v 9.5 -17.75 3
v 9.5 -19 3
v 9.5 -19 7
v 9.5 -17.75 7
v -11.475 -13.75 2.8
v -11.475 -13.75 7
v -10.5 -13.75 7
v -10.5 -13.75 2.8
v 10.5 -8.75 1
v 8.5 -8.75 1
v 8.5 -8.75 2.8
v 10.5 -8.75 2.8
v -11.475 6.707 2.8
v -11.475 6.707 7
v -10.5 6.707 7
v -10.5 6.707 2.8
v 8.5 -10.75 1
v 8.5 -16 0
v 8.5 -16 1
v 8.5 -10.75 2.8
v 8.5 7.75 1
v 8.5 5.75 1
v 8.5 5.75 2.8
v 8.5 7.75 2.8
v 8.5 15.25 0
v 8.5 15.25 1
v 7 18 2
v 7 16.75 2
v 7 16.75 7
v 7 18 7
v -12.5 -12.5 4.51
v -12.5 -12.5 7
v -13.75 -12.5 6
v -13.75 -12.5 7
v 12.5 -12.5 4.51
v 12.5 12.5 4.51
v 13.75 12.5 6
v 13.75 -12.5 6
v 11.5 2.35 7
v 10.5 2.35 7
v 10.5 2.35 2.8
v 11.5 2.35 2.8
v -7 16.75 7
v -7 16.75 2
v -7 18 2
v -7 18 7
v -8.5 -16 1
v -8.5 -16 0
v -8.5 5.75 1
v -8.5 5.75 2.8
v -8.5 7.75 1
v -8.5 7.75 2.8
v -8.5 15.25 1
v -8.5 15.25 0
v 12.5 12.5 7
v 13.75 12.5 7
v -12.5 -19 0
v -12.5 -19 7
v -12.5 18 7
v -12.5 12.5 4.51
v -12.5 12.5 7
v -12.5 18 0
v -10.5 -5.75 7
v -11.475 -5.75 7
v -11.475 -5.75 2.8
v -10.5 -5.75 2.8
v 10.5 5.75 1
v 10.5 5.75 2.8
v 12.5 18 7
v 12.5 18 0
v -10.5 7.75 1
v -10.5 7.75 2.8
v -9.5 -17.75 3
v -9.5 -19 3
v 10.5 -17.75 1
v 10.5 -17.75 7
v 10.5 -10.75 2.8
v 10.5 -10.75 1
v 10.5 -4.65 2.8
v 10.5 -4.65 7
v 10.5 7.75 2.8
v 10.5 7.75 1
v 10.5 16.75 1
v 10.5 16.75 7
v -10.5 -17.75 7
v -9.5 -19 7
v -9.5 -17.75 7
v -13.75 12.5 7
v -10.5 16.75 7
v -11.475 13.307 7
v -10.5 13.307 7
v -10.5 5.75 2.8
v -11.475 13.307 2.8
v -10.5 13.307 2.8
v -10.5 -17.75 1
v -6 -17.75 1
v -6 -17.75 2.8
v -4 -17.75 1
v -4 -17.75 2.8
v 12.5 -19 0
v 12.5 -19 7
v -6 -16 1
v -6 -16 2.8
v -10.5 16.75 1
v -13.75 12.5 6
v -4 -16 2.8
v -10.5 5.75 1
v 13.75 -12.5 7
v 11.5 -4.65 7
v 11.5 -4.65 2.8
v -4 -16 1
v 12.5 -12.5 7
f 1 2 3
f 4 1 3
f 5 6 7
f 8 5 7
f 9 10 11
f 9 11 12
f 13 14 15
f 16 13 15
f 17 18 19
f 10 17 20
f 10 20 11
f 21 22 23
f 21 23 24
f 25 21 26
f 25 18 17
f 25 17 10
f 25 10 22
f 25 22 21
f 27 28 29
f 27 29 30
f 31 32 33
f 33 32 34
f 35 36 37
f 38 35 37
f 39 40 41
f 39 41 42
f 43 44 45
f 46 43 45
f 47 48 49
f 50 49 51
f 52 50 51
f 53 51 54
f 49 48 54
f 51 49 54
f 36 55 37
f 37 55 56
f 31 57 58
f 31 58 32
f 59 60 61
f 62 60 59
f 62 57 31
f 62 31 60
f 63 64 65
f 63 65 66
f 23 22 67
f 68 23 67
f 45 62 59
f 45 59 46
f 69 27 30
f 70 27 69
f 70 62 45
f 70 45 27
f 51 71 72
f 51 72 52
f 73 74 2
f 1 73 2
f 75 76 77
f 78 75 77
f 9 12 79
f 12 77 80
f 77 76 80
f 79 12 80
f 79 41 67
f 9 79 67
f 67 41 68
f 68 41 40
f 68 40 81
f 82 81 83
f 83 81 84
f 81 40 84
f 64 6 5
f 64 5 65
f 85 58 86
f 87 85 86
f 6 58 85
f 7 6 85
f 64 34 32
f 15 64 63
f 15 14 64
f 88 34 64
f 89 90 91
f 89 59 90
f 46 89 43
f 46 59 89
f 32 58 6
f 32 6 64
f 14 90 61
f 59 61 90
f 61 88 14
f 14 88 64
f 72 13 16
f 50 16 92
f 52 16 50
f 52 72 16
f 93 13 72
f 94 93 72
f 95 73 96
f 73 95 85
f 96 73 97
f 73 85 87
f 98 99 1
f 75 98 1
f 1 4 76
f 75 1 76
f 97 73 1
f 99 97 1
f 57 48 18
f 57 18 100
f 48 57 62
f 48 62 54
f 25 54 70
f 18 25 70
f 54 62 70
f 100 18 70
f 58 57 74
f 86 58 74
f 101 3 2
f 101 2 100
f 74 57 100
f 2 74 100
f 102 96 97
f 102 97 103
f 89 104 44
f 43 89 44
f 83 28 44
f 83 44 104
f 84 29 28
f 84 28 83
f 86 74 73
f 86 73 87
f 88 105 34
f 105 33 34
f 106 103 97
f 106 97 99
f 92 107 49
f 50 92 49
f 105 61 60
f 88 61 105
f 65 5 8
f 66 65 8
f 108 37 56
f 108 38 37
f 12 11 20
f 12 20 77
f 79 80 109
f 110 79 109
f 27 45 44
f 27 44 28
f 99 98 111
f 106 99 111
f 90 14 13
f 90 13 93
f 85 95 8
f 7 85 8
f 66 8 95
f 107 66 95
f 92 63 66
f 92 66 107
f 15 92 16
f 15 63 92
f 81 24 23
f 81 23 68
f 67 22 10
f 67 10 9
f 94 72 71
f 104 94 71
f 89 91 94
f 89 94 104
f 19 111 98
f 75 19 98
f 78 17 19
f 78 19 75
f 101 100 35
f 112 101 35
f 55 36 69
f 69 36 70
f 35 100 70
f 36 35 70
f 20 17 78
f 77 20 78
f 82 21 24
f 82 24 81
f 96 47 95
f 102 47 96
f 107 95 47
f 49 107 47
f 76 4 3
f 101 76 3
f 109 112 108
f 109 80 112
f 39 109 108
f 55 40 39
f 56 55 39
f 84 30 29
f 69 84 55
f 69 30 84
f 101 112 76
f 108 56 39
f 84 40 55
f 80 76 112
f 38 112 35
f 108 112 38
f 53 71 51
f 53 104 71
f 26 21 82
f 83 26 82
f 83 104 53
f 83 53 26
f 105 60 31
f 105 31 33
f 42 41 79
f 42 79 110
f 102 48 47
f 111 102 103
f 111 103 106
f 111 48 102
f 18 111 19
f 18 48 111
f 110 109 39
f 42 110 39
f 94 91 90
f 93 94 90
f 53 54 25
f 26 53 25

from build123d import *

# Parameters (mm, degrees)
F0_W      = 25
F0_H      = 38
F1_DEPTH  = 7
F2_W      = 21
F2_H      = 34.5
F3_DEPTH  = 6
F4_W      = 2
F4_H      = 2
F5_DEPTH  = 1.8
F6_W      = 17
F6_H      = 31.25
F7_DEPTH  = 7.001
F8_W      = 0.0254269466
F8_H      = 6.6
F8_W_2    = 0.9745730534
F8_W_3    = 1
F8_H_2    = 7
F8_H_3    = 8
F9_DEPTH  = 4.2
F11_W     = 14
F11_H     = 5
F12_DEPTH = 5
F13_DEPTH = 1
F15_DEPTH = 12.5
F16_W     = 19
F16_H     = 4
F17_DEPTH = 3


# Not quite as in the source:
# - a pattern or mirror of a feature is missing from the dataset's text; its kind, count and spacing are read off the source's solid
# - a feature names something its author has since deleted; it is built from what else it names


with BuildPart() as f1:
    # F0 (on Top) → F1 (new body)
    with BuildSketch(Plane.XY):
        Rectangle(F0_W, F0_H)
    extrude(amount=F1_DEPTH)

    # F2 (on face) → F3 (cut)
    with BuildSketch(Plane.XY.offset(7)):
        with Locations((0, -0.5)):
            Rectangle(F2_W, F2_H)
    extrude(amount=-F3_DEPTH, mode=Mode.SUBTRACT)

    # F4 (on face) → F5 (join)
    with BuildSketch(Plane.XY.offset(1)):
        with Locations((-9.5, 6.75)):
            Rectangle(F4_W, F4_H)
        with Locations((9.5, 6.75)):
            Rectangle(F4_W, F4_H)
        with Locations((9.5, -9.75)):
            Rectangle(F4_W, F4_H)
        with Locations((-5, -17)):
            Rectangle(F4_W, F4_H)
    extrude(amount=F5_DEPTH)

    # F6 (on Top) → F7 (cut, through all)
    with BuildSketch(Plane.XY):
        with Locations((0, -0.375)):
            Rectangle(F6_W, F6_H)
    extrude(amount=F7_DEPTH, mode=Mode.SUBTRACT)

    # F8 (on face) → F9 (cut, through all)
    with BuildSketch(Plane.XY.offset(7)):
        with Locations((-10.4872865267, 10.0065428064)):
            Rectangle(F8_W, F8_H)
        with Locations((-10.9872865267, 10.0065428064)):
            Rectangle(F8_W_2, F8_H)
        with Locations((11, -1.15)):
            Rectangle(F8_W_3, F8_H_2)
        with Locations((-10.9872865267, -9.75)):
            Rectangle(F8_W_2, F8_H_3)
    extrude(amount=-F9_DEPTH, mode=Mode.SUBTRACT)

    # F11 (on offset) → F12 (cut)
    with BuildSketch(Plane.XY.offset(2)):
        with Locations((0, 19.25)):
            Rectangle(F11_W, F11_H)
    extrude(amount=F12_DEPTH, mode=Mode.SUBTRACT)

    # F13 (cut): a face of the model
    f13_faces = [f1.faces().sort_by_distance(p)[0] for p in [
        (0, 19, 0.2596150997),
    ]]
    extrude(f13_faces, amount=-F13_DEPTH, mode=Mode.SUBTRACT)

    # F14 (on Front) → F15 (join, symmetric)
    with BuildSketch(Plane.XZ):
        Polygon((13.75, 7), (12.5, 7), (12.5, 4.5103080093), (13.75, 6), align=None)
    f15 = extrude(amount=F15_DEPTH, both=True)

    # F15_copies: F15 across plane
    add(f15.mirror(Plane(origin=(0, 0, 0), x_dir=(0, 0, -1), z_dir=(-1, 0, 0))))

    # F16 (on face) → F17 (cut)
    with BuildSketch(Plane.XZ.offset(19)):
        with Locations((0, 5)):
            Rectangle(F16_W, F16_H)
    extrude(amount=-F17_DEPTH, mode=Mode.SUBTRACT)


solid = f1.part
